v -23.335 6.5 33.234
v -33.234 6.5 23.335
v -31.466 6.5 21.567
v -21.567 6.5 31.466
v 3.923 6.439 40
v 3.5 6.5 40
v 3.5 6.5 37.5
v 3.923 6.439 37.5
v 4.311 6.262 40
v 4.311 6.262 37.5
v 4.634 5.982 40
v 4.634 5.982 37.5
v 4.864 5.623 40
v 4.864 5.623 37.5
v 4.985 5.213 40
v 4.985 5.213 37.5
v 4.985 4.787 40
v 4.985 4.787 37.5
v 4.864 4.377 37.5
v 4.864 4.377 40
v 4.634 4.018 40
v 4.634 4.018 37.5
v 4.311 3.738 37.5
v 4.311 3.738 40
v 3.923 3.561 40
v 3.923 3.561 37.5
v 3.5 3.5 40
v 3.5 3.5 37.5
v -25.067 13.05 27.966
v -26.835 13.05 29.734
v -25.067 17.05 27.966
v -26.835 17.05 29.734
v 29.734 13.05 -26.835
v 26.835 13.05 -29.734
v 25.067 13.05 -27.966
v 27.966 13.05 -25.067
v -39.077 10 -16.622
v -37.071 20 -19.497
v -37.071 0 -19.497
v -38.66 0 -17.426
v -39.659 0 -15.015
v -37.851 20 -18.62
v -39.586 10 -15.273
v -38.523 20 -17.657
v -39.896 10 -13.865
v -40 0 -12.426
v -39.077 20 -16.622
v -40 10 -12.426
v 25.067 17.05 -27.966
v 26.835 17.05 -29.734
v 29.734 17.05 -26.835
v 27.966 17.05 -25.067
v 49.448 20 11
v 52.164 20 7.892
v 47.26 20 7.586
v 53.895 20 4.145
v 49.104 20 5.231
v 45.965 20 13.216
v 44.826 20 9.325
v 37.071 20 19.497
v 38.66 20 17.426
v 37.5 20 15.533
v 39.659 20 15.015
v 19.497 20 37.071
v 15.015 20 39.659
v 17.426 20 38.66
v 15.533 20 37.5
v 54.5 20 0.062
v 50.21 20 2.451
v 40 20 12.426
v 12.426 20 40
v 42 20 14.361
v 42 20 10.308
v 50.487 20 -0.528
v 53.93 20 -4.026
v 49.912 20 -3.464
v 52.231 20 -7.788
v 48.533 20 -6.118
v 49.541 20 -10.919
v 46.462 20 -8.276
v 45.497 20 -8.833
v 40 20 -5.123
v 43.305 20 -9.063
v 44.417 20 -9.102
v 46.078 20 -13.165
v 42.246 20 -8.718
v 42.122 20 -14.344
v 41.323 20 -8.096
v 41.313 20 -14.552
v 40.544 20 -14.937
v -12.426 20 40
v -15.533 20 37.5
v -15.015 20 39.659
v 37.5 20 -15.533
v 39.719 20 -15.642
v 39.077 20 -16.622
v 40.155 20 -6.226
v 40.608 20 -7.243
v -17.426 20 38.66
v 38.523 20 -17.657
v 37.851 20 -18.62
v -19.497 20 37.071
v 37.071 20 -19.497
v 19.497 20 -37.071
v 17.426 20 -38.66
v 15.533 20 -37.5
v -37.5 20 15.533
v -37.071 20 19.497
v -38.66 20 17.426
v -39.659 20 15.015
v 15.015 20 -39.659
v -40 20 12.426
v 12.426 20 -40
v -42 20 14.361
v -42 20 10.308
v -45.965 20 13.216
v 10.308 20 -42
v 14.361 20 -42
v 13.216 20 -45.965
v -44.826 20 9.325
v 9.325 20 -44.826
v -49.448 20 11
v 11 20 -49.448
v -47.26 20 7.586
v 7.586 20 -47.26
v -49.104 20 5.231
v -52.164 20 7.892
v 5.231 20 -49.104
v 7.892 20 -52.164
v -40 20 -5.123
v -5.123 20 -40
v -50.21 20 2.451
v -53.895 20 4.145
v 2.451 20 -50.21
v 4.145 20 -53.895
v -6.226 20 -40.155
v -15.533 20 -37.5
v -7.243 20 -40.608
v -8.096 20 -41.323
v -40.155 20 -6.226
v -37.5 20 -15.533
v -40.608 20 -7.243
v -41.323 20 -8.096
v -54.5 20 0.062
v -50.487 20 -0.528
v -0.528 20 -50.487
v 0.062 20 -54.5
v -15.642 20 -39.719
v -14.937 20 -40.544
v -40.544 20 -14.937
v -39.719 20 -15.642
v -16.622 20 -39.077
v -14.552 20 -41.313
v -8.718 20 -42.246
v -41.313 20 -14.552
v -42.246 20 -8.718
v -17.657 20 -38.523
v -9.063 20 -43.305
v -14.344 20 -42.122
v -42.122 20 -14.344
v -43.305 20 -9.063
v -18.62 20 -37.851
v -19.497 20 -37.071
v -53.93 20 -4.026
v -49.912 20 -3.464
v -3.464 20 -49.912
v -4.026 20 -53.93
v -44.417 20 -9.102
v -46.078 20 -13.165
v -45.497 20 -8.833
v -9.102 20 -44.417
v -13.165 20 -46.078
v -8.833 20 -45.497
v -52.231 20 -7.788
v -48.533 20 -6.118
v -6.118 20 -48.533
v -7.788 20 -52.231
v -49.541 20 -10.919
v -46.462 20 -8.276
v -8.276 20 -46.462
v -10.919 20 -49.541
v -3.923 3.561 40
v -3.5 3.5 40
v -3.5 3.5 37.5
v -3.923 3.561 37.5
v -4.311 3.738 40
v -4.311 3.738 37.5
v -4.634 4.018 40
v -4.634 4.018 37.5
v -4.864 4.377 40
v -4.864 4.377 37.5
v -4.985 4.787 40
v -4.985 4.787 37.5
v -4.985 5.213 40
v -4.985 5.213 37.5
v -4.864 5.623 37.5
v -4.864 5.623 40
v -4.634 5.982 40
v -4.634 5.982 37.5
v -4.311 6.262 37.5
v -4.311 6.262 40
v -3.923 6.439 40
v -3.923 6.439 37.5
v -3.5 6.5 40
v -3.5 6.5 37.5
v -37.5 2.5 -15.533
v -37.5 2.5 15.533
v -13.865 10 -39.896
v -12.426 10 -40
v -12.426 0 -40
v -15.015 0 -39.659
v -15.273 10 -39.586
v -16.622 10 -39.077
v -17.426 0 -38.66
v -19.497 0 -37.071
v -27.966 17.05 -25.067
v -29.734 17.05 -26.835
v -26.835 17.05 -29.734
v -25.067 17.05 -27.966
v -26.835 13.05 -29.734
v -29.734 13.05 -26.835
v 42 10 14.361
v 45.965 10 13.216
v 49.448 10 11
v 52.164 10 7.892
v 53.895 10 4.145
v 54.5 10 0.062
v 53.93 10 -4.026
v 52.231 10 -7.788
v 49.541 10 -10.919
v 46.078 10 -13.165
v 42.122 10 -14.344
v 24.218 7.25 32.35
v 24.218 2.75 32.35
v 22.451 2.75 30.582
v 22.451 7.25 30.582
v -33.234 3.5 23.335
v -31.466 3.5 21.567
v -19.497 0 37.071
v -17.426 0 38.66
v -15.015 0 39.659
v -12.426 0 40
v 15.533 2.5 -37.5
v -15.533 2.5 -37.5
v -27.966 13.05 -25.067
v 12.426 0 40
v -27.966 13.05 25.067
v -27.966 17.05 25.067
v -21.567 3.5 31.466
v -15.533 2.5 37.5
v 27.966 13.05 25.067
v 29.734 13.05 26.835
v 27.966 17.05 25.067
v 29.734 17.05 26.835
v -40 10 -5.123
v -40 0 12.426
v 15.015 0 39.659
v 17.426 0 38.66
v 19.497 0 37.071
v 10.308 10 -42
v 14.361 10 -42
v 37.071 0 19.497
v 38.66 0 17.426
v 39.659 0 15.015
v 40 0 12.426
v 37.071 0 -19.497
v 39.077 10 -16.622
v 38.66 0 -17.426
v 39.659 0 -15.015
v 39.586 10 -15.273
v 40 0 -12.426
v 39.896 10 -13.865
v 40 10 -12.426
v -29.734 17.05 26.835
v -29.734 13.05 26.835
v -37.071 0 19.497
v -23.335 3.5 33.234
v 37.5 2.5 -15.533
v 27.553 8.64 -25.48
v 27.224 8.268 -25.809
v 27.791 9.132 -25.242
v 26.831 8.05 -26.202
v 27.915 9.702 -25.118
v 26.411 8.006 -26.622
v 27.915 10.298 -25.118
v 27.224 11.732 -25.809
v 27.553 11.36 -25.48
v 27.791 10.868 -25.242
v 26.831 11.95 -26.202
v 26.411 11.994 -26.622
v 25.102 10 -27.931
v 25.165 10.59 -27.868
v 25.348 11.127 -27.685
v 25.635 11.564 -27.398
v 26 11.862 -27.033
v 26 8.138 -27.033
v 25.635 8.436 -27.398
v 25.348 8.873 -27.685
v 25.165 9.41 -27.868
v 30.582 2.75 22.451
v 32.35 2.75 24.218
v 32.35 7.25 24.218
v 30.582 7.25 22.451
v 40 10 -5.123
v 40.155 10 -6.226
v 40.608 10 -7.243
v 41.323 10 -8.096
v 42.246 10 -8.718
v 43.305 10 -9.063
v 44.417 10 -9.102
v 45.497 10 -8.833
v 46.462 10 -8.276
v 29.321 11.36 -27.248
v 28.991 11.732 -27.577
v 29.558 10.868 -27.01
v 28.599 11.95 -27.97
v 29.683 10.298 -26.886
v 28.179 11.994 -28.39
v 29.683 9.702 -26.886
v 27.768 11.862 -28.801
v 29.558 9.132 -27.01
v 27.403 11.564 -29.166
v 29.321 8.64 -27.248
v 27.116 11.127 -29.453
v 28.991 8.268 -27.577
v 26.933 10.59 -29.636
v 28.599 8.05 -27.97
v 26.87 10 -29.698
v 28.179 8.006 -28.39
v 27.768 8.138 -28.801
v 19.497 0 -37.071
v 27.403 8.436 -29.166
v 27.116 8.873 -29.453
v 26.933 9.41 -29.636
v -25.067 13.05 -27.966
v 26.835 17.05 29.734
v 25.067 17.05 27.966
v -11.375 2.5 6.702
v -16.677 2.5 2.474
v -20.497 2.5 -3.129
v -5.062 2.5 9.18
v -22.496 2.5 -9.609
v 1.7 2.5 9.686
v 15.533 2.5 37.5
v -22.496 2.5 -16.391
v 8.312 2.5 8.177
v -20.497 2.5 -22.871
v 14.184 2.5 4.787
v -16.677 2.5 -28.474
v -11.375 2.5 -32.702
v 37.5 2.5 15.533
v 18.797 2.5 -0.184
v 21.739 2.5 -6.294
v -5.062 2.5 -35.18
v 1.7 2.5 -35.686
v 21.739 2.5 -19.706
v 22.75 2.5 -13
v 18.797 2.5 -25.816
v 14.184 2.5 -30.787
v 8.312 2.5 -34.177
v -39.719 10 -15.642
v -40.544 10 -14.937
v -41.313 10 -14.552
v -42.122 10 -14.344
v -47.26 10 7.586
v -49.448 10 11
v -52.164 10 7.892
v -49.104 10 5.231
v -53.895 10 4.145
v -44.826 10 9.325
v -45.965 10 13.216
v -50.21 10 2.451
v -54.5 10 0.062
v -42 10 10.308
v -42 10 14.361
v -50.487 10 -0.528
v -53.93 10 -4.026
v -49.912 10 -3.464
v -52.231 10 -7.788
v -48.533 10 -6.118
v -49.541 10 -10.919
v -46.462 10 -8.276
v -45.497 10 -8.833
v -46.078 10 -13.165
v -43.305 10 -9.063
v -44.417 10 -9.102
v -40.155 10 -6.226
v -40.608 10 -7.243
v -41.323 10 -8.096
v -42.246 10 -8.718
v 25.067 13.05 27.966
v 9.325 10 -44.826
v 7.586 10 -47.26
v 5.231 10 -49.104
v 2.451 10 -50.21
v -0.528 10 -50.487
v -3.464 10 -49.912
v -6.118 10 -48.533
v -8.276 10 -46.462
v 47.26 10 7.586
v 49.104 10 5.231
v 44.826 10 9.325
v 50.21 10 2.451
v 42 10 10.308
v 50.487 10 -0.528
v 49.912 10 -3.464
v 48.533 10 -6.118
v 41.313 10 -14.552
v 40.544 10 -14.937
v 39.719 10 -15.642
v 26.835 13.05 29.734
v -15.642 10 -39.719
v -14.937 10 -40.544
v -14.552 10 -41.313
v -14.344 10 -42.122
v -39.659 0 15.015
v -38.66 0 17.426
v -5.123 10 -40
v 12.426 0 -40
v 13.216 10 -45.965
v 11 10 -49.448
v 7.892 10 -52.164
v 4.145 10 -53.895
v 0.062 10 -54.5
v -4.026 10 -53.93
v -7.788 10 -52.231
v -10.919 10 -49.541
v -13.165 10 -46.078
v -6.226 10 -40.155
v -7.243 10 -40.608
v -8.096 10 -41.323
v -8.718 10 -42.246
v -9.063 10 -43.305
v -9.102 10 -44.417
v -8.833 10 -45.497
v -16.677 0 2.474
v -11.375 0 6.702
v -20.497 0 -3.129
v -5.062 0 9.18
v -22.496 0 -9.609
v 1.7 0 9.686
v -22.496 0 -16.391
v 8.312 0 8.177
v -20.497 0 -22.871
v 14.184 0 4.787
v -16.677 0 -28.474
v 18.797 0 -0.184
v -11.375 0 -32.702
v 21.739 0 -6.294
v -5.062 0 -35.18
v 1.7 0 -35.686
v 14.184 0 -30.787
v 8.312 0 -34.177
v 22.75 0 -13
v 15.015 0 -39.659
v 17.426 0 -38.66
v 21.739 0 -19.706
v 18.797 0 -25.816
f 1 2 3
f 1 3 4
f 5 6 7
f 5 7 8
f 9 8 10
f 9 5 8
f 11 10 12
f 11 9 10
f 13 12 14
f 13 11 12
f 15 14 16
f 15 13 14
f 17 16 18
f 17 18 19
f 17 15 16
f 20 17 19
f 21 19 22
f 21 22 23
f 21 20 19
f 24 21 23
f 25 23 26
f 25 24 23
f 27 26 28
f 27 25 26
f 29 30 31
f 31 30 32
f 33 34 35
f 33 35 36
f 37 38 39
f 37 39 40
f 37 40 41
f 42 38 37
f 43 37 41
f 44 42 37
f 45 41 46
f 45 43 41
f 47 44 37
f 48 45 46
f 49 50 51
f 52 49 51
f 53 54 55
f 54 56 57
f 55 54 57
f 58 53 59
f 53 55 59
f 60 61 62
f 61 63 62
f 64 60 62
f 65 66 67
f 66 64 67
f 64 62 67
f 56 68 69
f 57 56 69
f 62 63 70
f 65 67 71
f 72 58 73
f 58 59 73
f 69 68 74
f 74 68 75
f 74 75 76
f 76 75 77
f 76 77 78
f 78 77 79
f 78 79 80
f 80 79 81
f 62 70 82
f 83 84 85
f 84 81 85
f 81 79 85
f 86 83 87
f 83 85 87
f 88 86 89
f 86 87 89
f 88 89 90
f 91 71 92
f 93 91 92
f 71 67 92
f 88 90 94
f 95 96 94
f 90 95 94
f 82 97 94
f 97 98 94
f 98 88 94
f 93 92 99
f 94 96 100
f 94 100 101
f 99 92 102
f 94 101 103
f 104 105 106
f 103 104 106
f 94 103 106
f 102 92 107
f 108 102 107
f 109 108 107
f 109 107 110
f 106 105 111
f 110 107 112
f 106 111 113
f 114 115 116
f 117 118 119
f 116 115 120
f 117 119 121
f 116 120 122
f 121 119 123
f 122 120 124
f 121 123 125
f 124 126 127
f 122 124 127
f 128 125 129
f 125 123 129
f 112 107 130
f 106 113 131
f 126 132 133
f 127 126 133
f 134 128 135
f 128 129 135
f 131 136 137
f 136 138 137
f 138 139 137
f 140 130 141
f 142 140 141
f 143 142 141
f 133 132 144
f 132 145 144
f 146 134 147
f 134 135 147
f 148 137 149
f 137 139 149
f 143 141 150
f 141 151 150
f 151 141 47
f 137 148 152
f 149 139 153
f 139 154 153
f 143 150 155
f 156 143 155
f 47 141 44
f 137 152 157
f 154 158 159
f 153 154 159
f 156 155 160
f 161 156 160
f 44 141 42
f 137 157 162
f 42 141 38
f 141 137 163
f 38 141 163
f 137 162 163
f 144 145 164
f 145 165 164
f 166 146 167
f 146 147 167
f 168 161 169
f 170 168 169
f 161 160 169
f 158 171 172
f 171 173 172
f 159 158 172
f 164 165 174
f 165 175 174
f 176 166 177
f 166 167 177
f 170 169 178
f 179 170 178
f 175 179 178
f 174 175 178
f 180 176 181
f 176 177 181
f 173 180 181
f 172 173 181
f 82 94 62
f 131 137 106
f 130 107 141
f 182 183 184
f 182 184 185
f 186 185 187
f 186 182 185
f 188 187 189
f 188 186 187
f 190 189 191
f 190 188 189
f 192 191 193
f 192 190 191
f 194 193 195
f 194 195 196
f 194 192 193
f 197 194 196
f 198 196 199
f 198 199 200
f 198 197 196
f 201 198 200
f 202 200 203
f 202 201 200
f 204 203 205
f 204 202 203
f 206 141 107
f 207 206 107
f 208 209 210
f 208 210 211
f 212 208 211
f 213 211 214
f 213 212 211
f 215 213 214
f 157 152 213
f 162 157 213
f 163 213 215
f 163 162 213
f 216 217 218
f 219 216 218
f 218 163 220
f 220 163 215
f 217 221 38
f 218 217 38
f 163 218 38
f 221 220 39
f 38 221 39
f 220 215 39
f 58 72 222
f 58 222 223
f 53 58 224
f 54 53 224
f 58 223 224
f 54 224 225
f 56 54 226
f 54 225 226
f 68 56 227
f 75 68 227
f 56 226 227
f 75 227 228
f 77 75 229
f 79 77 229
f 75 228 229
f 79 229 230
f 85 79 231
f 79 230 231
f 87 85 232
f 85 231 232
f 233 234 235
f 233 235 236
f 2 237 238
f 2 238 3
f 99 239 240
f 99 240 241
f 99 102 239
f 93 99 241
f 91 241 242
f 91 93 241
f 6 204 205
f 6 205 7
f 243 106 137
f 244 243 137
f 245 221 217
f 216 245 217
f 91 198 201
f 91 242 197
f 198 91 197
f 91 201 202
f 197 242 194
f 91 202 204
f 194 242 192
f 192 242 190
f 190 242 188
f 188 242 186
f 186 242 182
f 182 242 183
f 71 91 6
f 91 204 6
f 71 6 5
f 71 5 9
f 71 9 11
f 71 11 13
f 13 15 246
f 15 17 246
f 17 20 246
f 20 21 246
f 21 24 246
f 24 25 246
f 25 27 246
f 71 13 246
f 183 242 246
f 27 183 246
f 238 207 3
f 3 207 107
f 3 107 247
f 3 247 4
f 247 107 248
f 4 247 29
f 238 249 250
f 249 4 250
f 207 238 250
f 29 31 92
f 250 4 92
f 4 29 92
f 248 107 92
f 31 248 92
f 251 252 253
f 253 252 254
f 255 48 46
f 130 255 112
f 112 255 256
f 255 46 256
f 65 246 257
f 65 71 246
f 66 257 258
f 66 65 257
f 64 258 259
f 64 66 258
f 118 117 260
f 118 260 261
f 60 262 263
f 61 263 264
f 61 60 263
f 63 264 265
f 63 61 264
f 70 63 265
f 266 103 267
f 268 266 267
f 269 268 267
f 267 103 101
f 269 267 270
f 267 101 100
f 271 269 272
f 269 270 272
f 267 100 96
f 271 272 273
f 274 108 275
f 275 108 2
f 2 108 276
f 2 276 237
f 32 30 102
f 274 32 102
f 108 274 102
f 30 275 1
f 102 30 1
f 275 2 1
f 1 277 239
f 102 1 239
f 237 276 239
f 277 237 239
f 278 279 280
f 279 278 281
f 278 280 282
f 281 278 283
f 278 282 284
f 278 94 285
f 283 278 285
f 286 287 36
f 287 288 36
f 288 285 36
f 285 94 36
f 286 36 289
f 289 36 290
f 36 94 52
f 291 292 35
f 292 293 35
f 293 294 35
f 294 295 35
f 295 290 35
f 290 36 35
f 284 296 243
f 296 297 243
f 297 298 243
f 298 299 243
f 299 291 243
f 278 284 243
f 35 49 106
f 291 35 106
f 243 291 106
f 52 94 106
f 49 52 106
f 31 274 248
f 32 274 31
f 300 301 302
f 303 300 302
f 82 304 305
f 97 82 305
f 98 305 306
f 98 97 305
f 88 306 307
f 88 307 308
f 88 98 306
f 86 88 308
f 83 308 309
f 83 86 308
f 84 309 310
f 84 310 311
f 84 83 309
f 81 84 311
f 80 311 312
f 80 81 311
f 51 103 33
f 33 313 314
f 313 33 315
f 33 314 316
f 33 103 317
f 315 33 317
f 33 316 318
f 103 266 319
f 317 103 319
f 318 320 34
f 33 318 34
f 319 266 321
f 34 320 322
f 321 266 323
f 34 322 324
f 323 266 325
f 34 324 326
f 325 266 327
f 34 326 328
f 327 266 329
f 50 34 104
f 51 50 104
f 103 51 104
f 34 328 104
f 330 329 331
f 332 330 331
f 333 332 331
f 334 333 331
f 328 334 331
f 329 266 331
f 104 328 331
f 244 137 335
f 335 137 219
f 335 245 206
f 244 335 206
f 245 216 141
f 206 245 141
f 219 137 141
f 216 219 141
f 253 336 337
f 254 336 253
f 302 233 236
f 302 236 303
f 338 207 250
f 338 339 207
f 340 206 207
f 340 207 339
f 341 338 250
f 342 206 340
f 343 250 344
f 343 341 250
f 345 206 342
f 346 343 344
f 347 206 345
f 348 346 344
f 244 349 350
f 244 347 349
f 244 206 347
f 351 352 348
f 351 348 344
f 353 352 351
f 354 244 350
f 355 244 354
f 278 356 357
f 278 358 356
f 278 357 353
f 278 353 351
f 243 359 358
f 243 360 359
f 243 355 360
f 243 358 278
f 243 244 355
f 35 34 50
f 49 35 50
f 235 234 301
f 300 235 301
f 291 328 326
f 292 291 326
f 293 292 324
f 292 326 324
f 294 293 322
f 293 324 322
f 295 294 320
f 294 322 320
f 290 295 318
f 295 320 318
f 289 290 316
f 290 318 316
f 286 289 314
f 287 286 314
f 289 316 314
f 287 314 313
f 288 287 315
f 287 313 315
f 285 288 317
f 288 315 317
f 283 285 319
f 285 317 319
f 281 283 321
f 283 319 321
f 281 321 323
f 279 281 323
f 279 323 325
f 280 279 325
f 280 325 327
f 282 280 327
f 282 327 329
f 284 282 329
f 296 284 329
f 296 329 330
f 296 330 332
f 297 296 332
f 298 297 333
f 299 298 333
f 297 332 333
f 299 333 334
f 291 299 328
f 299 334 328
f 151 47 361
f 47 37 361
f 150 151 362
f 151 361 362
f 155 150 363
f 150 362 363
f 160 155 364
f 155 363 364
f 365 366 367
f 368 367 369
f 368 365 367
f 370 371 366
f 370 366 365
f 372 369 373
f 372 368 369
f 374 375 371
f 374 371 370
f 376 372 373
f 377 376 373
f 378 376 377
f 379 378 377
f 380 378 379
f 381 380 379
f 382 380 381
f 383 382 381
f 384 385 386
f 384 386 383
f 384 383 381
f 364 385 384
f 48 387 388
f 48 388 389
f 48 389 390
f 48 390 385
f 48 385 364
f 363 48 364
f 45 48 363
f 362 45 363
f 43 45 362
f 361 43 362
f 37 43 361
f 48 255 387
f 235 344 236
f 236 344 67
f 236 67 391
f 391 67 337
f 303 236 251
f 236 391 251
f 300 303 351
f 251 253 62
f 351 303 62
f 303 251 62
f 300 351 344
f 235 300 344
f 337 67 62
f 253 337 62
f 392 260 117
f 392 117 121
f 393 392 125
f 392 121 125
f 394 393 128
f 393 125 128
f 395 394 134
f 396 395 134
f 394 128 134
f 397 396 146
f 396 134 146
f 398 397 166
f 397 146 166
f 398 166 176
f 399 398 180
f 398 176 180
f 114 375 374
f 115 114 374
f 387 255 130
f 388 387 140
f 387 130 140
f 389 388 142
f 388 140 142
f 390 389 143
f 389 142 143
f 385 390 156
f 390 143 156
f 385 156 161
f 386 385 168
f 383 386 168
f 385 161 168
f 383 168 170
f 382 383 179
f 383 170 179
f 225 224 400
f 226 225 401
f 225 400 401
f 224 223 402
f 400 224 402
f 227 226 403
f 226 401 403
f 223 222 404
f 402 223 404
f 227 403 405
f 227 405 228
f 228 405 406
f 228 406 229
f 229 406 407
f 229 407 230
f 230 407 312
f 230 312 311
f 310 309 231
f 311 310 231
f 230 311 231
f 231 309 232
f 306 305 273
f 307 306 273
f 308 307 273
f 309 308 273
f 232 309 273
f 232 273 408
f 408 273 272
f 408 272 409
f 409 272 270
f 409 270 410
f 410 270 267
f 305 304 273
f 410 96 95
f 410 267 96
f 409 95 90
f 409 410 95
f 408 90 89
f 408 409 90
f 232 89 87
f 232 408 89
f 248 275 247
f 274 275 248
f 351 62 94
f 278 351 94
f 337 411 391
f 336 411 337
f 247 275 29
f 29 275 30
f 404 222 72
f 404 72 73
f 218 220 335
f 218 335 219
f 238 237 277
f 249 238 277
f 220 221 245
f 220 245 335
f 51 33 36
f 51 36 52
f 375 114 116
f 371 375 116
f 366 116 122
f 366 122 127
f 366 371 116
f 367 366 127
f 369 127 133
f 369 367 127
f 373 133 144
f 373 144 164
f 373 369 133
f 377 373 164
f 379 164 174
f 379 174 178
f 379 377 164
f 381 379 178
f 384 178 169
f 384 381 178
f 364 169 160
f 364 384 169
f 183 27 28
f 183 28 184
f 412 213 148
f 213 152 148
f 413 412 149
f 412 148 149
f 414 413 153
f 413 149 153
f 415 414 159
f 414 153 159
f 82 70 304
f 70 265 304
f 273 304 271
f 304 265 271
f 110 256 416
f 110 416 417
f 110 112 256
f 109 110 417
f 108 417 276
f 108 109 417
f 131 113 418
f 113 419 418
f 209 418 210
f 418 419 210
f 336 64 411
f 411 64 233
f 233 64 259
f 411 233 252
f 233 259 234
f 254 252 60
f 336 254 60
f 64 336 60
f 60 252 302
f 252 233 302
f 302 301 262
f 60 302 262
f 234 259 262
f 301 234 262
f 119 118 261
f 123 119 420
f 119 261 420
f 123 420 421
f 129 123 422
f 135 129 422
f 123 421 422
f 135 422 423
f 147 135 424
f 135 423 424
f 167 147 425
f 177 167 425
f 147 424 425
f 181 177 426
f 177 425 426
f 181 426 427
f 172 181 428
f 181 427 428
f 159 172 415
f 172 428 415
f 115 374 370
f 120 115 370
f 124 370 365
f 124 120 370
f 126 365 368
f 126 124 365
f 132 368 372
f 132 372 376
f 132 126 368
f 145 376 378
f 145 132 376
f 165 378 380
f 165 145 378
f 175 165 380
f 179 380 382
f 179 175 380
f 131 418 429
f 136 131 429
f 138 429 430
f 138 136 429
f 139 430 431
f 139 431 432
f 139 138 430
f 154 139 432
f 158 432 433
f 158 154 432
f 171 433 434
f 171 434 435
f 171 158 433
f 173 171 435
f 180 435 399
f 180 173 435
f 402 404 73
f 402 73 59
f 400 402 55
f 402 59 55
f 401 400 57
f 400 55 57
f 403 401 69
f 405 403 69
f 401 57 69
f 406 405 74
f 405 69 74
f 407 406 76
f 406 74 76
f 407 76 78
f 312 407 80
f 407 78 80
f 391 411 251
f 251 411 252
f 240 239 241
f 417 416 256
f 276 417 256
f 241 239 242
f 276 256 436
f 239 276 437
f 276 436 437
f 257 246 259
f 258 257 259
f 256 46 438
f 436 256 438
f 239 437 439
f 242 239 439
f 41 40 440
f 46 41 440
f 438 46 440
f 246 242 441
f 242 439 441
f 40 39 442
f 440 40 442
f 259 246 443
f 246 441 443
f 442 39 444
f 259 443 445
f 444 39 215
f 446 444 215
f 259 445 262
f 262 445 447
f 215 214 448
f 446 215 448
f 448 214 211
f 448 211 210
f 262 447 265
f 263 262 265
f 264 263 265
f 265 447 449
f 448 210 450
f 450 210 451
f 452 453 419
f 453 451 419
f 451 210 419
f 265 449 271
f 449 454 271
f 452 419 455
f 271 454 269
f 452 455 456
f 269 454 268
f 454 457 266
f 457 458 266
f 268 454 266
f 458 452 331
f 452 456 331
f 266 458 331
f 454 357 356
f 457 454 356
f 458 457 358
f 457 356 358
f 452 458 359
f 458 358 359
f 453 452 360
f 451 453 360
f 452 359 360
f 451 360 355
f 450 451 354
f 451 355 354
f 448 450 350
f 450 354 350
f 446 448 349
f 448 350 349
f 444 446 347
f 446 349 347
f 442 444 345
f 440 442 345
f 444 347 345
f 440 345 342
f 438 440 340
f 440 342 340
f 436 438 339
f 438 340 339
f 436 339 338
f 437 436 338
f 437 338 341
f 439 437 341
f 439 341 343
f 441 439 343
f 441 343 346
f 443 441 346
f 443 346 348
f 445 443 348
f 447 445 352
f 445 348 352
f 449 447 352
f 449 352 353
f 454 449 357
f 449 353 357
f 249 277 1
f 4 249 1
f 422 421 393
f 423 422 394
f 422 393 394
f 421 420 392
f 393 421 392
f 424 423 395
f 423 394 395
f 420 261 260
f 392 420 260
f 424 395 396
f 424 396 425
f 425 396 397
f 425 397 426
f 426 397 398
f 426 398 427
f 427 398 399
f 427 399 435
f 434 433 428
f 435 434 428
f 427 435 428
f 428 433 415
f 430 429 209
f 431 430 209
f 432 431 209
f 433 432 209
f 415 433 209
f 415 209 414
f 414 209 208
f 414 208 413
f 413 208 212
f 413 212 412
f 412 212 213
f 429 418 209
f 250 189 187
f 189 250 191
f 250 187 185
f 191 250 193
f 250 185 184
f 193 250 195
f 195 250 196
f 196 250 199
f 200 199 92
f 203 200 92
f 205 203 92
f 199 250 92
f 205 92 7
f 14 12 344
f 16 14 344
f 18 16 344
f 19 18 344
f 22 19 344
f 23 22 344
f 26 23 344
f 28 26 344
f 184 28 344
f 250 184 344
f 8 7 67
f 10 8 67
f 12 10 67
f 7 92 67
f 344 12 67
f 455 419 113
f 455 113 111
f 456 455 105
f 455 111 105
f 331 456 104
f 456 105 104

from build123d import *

# Parameters (mm, degrees)
BOSS_EXTRUDE1_DEPTH = 20
SKETCH5_W           = 4
SKETCH5_H           = 10
SKETCH16_W          = 2
SKETCH16_H          = 4.5
CUT_EXTRUDE9_DEPTH  = 10
SKETCH19_W          = 4
SKETCH19_H          = 10
CUT_EXTRUDE4_DEPTH  = 17.5
CUT_EXTRUDE5_DEPTH  = 2.5
SKETCH15_W          = 11.5
SKETCH15_H          = 4.5
CUT_EXTRUDE8_DEPTH  = 2.5
SKETCH17_W          = 14
SKETCH17_H          = 3
CUT_EXTRUDE10_DEPTH = 2.5
SKETCH21_W          = 4.5
SKETCH21_H          = 2
CUT_EXTRUDE11_DEPTH = 10
SKETCH22_R          = 2
CUT_EXTRUDE12_DEPTH = 2.5
FILLET1_R           = 10
FILLET2_R           = 4
SKETCH24_W          = 4.1
SKETCH24_H          = 4
CUT_EXTRUDE14_DEPTH = 77.5
SKETCH28_W          = 4.1
SKETCH28_H          = 4
CUT_EXTRUDE15_DEPTH = 77.5
SKETCH23_R          = 22.75
CUT_EXTRUDE13_DEPTH = 2.5


with BuildPart() as part:
    # Sketch1 → Boss-Extrude1 (new body)
    with BuildSketch(Plane(origin=(0, 0, 0), x_dir=(1, 0, 0), z_dir=(0, 1, 0))):
        Polygon((16.568542495, 40), (-16.568542495, 40), (-40, 16.568542495), (-40, -16.568542495), (-16.568542495, -40), (16.568542495, -40), (40, -16.568542495), (40, 16.568542495), align=None)
    extrude(amount=BOSS_EXTRUDE1_DEPTH)

    # Sweep9: sweep along a path in Sketch7
    with BuildLine(Plane(origin=(0, 15, 0), x_dir=(1, 0, 0), z_dir=(0, 1, 0))) as sweep9_path:
        ThreePointArc((40, -10.5), (50.5, 0), (40, 10.5))
    # Sketch5 → Sweep9 (sweep)
    with BuildSketch(Plane(origin=(40, 0, 0), x_dir=(0, 0, -1), z_dir=(1, 0, 0))):
        with Locations((-12.5, 15)):
            Rectangle(SKETCH5_W, SKETCH5_H)
        with Locations((12.5, 15)):
            Rectangle(SKETCH5_W, SKETCH5_H)
    sweep9 = sweep(path=sweep9_path.line)

    # Sketch16 → Cut-Extrude9 (cut)
    with BuildSketch(Plane(origin=(0, 20, 0), x_dir=(1, 0, 0), z_dir=(0, 1, 0))):
        with Locations((41, -12.25)):
            Rectangle(SKETCH16_W, SKETCH16_H)
    cut_extrude9 = extrude(amount=-CUT_EXTRUDE9_DEPTH, mode=Mode.SUBTRACT)

    # Mirror1: Sweep9, Cut-Extrude9 across plane
    add(sweep9.mirror(Plane(origin=(0, 0, 0), x_dir=(0, 0, 1), z_dir=(1, 0, 0))))
    add(cut_extrude9.mirror(Plane(origin=(0, 0, 0), x_dir=(0, 0, 1), z_dir=(1, 0, 0))), mode=Mode.SUBTRACT)

    # Sweep10: sweep along a path in Sketch20
    with BuildLine(Plane(origin=(0, 15, 0), x_dir=(1, 0, 0), z_dir=(0, 1, 0))) as sweep10_path:
        ThreePointArc((10.5, 40), (0, 50.5), (-10.5, 40))
    # Sketch19 → Sweep10 (sweep)
    with BuildSketch(Plane(origin=(0, 0, -40), x_dir=(-1, 0, 0), z_dir=(0, 0, -1))):
        with Locations((-12.5, 15)):
            Rectangle(SKETCH19_W, SKETCH19_H)
        with Locations((12.5, 15)):
            Rectangle(SKETCH19_W, SKETCH19_H)
    sweep(path=sweep10_path.line)

    # Sketch6 → Cut-Extrude4 (cut)
    with BuildSketch(Plane(origin=(0, 20, 0), x_dir=(1, 0, 0), z_dir=(0, 1, 0))):
        Polygon((-15.533008589, -37.5), (15.533008589, -37.5), (37.5, -15.533008589), (37.5, 15.533008589), (15.533008589, 37.5), (-15.533008589, 37.5), (-37.5, 15.533008589), (-37.5, -15.533008589), align=None)
    extrude(amount=-CUT_EXTRUDE4_DEPTH, mode=Mode.SUBTRACT)

    # Sketch3 → Cut-Extrude5 (cut)
    with BuildSketch(Plane.XY.offset(40)):
        with BuildLine():
            Line((-3.5, 6.5), (3.5, 6.5))
            ThreePointArc((3.5, 6.5), (5, 5), (3.5, 3.5))
            Line((3.5, 3.5), (-3.5, 3.5))
            ThreePointArc((-3.5, 3.5), (-5, 5), (-3.5, 6.5))
        make_face()
    extrude(amount=-CUT_EXTRUDE5_DEPTH, mode=Mode.SUBTRACT)

    # Sketch15 → Cut-Extrude8 (cut)
    with BuildSketch(Plane(origin=(28.284271247, 0, 28.284271247), x_dir=(0.707106781, 0, -0.707106781), z_dir=(0.707106781, 0, 0.707106781))):
        with Locations((0, 5)):
            Rectangle(SKETCH15_W, SKETCH15_H)
    extrude(amount=-CUT_EXTRUDE8_DEPTH, mode=Mode.SUBTRACT)

    # Sketch17 → Cut-Extrude10 (cut)
    with BuildSketch(Plane(origin=(-28.284271247, 0, 28.284271247), x_dir=(0.707106781, 0, 0.707106781), z_dir=(-0.707106781, 0, 0.707106781))):
        with Locations((0, 5)):
            Rectangle(SKETCH17_W, SKETCH17_H)
    extrude(amount=-CUT_EXTRUDE10_DEPTH, mode=Mode.SUBTRACT)

    # Sketch21 → Cut-Extrude11 (cut)
    with BuildSketch(Plane(origin=(0, 20, 0), x_dir=(1, 0, 0), z_dir=(0, 1, 0))):
        with Locations((12.25, 41)):
            Rectangle(SKETCH21_W, SKETCH21_H)
    extrude(amount=-CUT_EXTRUDE11_DEPTH, mode=Mode.SUBTRACT)

    # Sketch22 → Cut-Extrude12 (cut)
    with BuildSketch(Plane(origin=(28.284271247, 0, -28.284271247), x_dir=(-0.707106781, 0, -0.707106781), z_dir=(0.707106781, 0, -0.707106781))):
        with Locations((0, 10)):
            Circle(SKETCH22_R)
    extrude(amount=-CUT_EXTRUDE12_DEPTH, mode=Mode.SUBTRACT)

    # Fillet1
    fillet1_edges = [part.edges().sort_by_distance(p)[0] for p in [
        (-40, 10, -16.568542495),
        (-16.568542495, 10, -40),
        (16.568542495, 10, -40),
        (40, 10, -16.568542495),
        (-40, 10, 16.568542495),
        (40, 10, 16.568542495),
        (16.568542495, 10, 40),
        (-16.568542495, 10, 40),
    ]]
    fillet(fillet1_edges, radius=FILLET1_R)

    # Fillet2
    fillet2_edges = [part.edges().sort_by_distance(p)[0] for p in [
        (-10.5, 15, -40),
        (40, 15, -10.5),
        (-39.782992577, 15, -14.498376039),
        (-14.498376039, 15, -39.782992577),
        (39.782992577, 15, -14.498376039),
        (-40, 15, -10.5),
    ]]
    fillet(fillet2_edges, radius=FILLET2_R)

    # Sketch24 → Cut-Extrude14 (cut)
    with BuildSketch(Plane(origin=(-28.284271247, 0, 28.284271247), x_dir=(0.707106781, 0, 0.707106781), z_dir=(-0.707106781, 0, 0.707106781))):
        with Locations((0, 15.05)):
            Rectangle(SKETCH24_W, SKETCH24_H)
    cut_extrude14 = extrude(amount=-CUT_EXTRUDE14_DEPTH, mode=Mode.SUBTRACT)

    # Mirror2: Cut-Extrude14 across plane
    add(cut_extrude14.mirror(Plane(origin=(0, 0, 0), x_dir=(0.707106781, 0, 0.707106781), z_dir=(-0.707106781, 0, 0.707106781))), mode=Mode.SUBTRACT)

    # Sketch28 → Cut-Extrude15 (cut)
    with BuildSketch(Plane(origin=(28.284271247, 0, 28.284271247), x_dir=(0.707106781, 0, -0.707106781), z_dir=(0.707106781, 0, 0.707106781))):
        with Locations((0, 15.05)):
            Rectangle(SKETCH28_W, SKETCH28_H)
    cut_extrude15 = extrude(amount=-CUT_EXTRUDE15_DEPTH, mode=Mode.SUBTRACT)

    # Mirror3: Cut-Extrude15 across plane
    add(cut_extrude15.mirror(Plane(origin=(0, 0, 0), x_dir=(-0.707106781, 0, 0.707106781), z_dir=(0.707106781, 0, 0.707106781))), mode=Mode.SUBTRACT)

    # Sketch23 → Cut-Extrude13 (cut)
    with BuildSketch(Plane(origin=(0, 2.5, 0), x_dir=(1, 0, 0), z_dir=(0, 1, 0))):
        with Locations((0, 13)):
            Circle(SKETCH23_R)
    extrude(amount=-CUT_EXTRUDE13_DEPTH, mode=Mode.SUBTRACT)


solid = part.part
